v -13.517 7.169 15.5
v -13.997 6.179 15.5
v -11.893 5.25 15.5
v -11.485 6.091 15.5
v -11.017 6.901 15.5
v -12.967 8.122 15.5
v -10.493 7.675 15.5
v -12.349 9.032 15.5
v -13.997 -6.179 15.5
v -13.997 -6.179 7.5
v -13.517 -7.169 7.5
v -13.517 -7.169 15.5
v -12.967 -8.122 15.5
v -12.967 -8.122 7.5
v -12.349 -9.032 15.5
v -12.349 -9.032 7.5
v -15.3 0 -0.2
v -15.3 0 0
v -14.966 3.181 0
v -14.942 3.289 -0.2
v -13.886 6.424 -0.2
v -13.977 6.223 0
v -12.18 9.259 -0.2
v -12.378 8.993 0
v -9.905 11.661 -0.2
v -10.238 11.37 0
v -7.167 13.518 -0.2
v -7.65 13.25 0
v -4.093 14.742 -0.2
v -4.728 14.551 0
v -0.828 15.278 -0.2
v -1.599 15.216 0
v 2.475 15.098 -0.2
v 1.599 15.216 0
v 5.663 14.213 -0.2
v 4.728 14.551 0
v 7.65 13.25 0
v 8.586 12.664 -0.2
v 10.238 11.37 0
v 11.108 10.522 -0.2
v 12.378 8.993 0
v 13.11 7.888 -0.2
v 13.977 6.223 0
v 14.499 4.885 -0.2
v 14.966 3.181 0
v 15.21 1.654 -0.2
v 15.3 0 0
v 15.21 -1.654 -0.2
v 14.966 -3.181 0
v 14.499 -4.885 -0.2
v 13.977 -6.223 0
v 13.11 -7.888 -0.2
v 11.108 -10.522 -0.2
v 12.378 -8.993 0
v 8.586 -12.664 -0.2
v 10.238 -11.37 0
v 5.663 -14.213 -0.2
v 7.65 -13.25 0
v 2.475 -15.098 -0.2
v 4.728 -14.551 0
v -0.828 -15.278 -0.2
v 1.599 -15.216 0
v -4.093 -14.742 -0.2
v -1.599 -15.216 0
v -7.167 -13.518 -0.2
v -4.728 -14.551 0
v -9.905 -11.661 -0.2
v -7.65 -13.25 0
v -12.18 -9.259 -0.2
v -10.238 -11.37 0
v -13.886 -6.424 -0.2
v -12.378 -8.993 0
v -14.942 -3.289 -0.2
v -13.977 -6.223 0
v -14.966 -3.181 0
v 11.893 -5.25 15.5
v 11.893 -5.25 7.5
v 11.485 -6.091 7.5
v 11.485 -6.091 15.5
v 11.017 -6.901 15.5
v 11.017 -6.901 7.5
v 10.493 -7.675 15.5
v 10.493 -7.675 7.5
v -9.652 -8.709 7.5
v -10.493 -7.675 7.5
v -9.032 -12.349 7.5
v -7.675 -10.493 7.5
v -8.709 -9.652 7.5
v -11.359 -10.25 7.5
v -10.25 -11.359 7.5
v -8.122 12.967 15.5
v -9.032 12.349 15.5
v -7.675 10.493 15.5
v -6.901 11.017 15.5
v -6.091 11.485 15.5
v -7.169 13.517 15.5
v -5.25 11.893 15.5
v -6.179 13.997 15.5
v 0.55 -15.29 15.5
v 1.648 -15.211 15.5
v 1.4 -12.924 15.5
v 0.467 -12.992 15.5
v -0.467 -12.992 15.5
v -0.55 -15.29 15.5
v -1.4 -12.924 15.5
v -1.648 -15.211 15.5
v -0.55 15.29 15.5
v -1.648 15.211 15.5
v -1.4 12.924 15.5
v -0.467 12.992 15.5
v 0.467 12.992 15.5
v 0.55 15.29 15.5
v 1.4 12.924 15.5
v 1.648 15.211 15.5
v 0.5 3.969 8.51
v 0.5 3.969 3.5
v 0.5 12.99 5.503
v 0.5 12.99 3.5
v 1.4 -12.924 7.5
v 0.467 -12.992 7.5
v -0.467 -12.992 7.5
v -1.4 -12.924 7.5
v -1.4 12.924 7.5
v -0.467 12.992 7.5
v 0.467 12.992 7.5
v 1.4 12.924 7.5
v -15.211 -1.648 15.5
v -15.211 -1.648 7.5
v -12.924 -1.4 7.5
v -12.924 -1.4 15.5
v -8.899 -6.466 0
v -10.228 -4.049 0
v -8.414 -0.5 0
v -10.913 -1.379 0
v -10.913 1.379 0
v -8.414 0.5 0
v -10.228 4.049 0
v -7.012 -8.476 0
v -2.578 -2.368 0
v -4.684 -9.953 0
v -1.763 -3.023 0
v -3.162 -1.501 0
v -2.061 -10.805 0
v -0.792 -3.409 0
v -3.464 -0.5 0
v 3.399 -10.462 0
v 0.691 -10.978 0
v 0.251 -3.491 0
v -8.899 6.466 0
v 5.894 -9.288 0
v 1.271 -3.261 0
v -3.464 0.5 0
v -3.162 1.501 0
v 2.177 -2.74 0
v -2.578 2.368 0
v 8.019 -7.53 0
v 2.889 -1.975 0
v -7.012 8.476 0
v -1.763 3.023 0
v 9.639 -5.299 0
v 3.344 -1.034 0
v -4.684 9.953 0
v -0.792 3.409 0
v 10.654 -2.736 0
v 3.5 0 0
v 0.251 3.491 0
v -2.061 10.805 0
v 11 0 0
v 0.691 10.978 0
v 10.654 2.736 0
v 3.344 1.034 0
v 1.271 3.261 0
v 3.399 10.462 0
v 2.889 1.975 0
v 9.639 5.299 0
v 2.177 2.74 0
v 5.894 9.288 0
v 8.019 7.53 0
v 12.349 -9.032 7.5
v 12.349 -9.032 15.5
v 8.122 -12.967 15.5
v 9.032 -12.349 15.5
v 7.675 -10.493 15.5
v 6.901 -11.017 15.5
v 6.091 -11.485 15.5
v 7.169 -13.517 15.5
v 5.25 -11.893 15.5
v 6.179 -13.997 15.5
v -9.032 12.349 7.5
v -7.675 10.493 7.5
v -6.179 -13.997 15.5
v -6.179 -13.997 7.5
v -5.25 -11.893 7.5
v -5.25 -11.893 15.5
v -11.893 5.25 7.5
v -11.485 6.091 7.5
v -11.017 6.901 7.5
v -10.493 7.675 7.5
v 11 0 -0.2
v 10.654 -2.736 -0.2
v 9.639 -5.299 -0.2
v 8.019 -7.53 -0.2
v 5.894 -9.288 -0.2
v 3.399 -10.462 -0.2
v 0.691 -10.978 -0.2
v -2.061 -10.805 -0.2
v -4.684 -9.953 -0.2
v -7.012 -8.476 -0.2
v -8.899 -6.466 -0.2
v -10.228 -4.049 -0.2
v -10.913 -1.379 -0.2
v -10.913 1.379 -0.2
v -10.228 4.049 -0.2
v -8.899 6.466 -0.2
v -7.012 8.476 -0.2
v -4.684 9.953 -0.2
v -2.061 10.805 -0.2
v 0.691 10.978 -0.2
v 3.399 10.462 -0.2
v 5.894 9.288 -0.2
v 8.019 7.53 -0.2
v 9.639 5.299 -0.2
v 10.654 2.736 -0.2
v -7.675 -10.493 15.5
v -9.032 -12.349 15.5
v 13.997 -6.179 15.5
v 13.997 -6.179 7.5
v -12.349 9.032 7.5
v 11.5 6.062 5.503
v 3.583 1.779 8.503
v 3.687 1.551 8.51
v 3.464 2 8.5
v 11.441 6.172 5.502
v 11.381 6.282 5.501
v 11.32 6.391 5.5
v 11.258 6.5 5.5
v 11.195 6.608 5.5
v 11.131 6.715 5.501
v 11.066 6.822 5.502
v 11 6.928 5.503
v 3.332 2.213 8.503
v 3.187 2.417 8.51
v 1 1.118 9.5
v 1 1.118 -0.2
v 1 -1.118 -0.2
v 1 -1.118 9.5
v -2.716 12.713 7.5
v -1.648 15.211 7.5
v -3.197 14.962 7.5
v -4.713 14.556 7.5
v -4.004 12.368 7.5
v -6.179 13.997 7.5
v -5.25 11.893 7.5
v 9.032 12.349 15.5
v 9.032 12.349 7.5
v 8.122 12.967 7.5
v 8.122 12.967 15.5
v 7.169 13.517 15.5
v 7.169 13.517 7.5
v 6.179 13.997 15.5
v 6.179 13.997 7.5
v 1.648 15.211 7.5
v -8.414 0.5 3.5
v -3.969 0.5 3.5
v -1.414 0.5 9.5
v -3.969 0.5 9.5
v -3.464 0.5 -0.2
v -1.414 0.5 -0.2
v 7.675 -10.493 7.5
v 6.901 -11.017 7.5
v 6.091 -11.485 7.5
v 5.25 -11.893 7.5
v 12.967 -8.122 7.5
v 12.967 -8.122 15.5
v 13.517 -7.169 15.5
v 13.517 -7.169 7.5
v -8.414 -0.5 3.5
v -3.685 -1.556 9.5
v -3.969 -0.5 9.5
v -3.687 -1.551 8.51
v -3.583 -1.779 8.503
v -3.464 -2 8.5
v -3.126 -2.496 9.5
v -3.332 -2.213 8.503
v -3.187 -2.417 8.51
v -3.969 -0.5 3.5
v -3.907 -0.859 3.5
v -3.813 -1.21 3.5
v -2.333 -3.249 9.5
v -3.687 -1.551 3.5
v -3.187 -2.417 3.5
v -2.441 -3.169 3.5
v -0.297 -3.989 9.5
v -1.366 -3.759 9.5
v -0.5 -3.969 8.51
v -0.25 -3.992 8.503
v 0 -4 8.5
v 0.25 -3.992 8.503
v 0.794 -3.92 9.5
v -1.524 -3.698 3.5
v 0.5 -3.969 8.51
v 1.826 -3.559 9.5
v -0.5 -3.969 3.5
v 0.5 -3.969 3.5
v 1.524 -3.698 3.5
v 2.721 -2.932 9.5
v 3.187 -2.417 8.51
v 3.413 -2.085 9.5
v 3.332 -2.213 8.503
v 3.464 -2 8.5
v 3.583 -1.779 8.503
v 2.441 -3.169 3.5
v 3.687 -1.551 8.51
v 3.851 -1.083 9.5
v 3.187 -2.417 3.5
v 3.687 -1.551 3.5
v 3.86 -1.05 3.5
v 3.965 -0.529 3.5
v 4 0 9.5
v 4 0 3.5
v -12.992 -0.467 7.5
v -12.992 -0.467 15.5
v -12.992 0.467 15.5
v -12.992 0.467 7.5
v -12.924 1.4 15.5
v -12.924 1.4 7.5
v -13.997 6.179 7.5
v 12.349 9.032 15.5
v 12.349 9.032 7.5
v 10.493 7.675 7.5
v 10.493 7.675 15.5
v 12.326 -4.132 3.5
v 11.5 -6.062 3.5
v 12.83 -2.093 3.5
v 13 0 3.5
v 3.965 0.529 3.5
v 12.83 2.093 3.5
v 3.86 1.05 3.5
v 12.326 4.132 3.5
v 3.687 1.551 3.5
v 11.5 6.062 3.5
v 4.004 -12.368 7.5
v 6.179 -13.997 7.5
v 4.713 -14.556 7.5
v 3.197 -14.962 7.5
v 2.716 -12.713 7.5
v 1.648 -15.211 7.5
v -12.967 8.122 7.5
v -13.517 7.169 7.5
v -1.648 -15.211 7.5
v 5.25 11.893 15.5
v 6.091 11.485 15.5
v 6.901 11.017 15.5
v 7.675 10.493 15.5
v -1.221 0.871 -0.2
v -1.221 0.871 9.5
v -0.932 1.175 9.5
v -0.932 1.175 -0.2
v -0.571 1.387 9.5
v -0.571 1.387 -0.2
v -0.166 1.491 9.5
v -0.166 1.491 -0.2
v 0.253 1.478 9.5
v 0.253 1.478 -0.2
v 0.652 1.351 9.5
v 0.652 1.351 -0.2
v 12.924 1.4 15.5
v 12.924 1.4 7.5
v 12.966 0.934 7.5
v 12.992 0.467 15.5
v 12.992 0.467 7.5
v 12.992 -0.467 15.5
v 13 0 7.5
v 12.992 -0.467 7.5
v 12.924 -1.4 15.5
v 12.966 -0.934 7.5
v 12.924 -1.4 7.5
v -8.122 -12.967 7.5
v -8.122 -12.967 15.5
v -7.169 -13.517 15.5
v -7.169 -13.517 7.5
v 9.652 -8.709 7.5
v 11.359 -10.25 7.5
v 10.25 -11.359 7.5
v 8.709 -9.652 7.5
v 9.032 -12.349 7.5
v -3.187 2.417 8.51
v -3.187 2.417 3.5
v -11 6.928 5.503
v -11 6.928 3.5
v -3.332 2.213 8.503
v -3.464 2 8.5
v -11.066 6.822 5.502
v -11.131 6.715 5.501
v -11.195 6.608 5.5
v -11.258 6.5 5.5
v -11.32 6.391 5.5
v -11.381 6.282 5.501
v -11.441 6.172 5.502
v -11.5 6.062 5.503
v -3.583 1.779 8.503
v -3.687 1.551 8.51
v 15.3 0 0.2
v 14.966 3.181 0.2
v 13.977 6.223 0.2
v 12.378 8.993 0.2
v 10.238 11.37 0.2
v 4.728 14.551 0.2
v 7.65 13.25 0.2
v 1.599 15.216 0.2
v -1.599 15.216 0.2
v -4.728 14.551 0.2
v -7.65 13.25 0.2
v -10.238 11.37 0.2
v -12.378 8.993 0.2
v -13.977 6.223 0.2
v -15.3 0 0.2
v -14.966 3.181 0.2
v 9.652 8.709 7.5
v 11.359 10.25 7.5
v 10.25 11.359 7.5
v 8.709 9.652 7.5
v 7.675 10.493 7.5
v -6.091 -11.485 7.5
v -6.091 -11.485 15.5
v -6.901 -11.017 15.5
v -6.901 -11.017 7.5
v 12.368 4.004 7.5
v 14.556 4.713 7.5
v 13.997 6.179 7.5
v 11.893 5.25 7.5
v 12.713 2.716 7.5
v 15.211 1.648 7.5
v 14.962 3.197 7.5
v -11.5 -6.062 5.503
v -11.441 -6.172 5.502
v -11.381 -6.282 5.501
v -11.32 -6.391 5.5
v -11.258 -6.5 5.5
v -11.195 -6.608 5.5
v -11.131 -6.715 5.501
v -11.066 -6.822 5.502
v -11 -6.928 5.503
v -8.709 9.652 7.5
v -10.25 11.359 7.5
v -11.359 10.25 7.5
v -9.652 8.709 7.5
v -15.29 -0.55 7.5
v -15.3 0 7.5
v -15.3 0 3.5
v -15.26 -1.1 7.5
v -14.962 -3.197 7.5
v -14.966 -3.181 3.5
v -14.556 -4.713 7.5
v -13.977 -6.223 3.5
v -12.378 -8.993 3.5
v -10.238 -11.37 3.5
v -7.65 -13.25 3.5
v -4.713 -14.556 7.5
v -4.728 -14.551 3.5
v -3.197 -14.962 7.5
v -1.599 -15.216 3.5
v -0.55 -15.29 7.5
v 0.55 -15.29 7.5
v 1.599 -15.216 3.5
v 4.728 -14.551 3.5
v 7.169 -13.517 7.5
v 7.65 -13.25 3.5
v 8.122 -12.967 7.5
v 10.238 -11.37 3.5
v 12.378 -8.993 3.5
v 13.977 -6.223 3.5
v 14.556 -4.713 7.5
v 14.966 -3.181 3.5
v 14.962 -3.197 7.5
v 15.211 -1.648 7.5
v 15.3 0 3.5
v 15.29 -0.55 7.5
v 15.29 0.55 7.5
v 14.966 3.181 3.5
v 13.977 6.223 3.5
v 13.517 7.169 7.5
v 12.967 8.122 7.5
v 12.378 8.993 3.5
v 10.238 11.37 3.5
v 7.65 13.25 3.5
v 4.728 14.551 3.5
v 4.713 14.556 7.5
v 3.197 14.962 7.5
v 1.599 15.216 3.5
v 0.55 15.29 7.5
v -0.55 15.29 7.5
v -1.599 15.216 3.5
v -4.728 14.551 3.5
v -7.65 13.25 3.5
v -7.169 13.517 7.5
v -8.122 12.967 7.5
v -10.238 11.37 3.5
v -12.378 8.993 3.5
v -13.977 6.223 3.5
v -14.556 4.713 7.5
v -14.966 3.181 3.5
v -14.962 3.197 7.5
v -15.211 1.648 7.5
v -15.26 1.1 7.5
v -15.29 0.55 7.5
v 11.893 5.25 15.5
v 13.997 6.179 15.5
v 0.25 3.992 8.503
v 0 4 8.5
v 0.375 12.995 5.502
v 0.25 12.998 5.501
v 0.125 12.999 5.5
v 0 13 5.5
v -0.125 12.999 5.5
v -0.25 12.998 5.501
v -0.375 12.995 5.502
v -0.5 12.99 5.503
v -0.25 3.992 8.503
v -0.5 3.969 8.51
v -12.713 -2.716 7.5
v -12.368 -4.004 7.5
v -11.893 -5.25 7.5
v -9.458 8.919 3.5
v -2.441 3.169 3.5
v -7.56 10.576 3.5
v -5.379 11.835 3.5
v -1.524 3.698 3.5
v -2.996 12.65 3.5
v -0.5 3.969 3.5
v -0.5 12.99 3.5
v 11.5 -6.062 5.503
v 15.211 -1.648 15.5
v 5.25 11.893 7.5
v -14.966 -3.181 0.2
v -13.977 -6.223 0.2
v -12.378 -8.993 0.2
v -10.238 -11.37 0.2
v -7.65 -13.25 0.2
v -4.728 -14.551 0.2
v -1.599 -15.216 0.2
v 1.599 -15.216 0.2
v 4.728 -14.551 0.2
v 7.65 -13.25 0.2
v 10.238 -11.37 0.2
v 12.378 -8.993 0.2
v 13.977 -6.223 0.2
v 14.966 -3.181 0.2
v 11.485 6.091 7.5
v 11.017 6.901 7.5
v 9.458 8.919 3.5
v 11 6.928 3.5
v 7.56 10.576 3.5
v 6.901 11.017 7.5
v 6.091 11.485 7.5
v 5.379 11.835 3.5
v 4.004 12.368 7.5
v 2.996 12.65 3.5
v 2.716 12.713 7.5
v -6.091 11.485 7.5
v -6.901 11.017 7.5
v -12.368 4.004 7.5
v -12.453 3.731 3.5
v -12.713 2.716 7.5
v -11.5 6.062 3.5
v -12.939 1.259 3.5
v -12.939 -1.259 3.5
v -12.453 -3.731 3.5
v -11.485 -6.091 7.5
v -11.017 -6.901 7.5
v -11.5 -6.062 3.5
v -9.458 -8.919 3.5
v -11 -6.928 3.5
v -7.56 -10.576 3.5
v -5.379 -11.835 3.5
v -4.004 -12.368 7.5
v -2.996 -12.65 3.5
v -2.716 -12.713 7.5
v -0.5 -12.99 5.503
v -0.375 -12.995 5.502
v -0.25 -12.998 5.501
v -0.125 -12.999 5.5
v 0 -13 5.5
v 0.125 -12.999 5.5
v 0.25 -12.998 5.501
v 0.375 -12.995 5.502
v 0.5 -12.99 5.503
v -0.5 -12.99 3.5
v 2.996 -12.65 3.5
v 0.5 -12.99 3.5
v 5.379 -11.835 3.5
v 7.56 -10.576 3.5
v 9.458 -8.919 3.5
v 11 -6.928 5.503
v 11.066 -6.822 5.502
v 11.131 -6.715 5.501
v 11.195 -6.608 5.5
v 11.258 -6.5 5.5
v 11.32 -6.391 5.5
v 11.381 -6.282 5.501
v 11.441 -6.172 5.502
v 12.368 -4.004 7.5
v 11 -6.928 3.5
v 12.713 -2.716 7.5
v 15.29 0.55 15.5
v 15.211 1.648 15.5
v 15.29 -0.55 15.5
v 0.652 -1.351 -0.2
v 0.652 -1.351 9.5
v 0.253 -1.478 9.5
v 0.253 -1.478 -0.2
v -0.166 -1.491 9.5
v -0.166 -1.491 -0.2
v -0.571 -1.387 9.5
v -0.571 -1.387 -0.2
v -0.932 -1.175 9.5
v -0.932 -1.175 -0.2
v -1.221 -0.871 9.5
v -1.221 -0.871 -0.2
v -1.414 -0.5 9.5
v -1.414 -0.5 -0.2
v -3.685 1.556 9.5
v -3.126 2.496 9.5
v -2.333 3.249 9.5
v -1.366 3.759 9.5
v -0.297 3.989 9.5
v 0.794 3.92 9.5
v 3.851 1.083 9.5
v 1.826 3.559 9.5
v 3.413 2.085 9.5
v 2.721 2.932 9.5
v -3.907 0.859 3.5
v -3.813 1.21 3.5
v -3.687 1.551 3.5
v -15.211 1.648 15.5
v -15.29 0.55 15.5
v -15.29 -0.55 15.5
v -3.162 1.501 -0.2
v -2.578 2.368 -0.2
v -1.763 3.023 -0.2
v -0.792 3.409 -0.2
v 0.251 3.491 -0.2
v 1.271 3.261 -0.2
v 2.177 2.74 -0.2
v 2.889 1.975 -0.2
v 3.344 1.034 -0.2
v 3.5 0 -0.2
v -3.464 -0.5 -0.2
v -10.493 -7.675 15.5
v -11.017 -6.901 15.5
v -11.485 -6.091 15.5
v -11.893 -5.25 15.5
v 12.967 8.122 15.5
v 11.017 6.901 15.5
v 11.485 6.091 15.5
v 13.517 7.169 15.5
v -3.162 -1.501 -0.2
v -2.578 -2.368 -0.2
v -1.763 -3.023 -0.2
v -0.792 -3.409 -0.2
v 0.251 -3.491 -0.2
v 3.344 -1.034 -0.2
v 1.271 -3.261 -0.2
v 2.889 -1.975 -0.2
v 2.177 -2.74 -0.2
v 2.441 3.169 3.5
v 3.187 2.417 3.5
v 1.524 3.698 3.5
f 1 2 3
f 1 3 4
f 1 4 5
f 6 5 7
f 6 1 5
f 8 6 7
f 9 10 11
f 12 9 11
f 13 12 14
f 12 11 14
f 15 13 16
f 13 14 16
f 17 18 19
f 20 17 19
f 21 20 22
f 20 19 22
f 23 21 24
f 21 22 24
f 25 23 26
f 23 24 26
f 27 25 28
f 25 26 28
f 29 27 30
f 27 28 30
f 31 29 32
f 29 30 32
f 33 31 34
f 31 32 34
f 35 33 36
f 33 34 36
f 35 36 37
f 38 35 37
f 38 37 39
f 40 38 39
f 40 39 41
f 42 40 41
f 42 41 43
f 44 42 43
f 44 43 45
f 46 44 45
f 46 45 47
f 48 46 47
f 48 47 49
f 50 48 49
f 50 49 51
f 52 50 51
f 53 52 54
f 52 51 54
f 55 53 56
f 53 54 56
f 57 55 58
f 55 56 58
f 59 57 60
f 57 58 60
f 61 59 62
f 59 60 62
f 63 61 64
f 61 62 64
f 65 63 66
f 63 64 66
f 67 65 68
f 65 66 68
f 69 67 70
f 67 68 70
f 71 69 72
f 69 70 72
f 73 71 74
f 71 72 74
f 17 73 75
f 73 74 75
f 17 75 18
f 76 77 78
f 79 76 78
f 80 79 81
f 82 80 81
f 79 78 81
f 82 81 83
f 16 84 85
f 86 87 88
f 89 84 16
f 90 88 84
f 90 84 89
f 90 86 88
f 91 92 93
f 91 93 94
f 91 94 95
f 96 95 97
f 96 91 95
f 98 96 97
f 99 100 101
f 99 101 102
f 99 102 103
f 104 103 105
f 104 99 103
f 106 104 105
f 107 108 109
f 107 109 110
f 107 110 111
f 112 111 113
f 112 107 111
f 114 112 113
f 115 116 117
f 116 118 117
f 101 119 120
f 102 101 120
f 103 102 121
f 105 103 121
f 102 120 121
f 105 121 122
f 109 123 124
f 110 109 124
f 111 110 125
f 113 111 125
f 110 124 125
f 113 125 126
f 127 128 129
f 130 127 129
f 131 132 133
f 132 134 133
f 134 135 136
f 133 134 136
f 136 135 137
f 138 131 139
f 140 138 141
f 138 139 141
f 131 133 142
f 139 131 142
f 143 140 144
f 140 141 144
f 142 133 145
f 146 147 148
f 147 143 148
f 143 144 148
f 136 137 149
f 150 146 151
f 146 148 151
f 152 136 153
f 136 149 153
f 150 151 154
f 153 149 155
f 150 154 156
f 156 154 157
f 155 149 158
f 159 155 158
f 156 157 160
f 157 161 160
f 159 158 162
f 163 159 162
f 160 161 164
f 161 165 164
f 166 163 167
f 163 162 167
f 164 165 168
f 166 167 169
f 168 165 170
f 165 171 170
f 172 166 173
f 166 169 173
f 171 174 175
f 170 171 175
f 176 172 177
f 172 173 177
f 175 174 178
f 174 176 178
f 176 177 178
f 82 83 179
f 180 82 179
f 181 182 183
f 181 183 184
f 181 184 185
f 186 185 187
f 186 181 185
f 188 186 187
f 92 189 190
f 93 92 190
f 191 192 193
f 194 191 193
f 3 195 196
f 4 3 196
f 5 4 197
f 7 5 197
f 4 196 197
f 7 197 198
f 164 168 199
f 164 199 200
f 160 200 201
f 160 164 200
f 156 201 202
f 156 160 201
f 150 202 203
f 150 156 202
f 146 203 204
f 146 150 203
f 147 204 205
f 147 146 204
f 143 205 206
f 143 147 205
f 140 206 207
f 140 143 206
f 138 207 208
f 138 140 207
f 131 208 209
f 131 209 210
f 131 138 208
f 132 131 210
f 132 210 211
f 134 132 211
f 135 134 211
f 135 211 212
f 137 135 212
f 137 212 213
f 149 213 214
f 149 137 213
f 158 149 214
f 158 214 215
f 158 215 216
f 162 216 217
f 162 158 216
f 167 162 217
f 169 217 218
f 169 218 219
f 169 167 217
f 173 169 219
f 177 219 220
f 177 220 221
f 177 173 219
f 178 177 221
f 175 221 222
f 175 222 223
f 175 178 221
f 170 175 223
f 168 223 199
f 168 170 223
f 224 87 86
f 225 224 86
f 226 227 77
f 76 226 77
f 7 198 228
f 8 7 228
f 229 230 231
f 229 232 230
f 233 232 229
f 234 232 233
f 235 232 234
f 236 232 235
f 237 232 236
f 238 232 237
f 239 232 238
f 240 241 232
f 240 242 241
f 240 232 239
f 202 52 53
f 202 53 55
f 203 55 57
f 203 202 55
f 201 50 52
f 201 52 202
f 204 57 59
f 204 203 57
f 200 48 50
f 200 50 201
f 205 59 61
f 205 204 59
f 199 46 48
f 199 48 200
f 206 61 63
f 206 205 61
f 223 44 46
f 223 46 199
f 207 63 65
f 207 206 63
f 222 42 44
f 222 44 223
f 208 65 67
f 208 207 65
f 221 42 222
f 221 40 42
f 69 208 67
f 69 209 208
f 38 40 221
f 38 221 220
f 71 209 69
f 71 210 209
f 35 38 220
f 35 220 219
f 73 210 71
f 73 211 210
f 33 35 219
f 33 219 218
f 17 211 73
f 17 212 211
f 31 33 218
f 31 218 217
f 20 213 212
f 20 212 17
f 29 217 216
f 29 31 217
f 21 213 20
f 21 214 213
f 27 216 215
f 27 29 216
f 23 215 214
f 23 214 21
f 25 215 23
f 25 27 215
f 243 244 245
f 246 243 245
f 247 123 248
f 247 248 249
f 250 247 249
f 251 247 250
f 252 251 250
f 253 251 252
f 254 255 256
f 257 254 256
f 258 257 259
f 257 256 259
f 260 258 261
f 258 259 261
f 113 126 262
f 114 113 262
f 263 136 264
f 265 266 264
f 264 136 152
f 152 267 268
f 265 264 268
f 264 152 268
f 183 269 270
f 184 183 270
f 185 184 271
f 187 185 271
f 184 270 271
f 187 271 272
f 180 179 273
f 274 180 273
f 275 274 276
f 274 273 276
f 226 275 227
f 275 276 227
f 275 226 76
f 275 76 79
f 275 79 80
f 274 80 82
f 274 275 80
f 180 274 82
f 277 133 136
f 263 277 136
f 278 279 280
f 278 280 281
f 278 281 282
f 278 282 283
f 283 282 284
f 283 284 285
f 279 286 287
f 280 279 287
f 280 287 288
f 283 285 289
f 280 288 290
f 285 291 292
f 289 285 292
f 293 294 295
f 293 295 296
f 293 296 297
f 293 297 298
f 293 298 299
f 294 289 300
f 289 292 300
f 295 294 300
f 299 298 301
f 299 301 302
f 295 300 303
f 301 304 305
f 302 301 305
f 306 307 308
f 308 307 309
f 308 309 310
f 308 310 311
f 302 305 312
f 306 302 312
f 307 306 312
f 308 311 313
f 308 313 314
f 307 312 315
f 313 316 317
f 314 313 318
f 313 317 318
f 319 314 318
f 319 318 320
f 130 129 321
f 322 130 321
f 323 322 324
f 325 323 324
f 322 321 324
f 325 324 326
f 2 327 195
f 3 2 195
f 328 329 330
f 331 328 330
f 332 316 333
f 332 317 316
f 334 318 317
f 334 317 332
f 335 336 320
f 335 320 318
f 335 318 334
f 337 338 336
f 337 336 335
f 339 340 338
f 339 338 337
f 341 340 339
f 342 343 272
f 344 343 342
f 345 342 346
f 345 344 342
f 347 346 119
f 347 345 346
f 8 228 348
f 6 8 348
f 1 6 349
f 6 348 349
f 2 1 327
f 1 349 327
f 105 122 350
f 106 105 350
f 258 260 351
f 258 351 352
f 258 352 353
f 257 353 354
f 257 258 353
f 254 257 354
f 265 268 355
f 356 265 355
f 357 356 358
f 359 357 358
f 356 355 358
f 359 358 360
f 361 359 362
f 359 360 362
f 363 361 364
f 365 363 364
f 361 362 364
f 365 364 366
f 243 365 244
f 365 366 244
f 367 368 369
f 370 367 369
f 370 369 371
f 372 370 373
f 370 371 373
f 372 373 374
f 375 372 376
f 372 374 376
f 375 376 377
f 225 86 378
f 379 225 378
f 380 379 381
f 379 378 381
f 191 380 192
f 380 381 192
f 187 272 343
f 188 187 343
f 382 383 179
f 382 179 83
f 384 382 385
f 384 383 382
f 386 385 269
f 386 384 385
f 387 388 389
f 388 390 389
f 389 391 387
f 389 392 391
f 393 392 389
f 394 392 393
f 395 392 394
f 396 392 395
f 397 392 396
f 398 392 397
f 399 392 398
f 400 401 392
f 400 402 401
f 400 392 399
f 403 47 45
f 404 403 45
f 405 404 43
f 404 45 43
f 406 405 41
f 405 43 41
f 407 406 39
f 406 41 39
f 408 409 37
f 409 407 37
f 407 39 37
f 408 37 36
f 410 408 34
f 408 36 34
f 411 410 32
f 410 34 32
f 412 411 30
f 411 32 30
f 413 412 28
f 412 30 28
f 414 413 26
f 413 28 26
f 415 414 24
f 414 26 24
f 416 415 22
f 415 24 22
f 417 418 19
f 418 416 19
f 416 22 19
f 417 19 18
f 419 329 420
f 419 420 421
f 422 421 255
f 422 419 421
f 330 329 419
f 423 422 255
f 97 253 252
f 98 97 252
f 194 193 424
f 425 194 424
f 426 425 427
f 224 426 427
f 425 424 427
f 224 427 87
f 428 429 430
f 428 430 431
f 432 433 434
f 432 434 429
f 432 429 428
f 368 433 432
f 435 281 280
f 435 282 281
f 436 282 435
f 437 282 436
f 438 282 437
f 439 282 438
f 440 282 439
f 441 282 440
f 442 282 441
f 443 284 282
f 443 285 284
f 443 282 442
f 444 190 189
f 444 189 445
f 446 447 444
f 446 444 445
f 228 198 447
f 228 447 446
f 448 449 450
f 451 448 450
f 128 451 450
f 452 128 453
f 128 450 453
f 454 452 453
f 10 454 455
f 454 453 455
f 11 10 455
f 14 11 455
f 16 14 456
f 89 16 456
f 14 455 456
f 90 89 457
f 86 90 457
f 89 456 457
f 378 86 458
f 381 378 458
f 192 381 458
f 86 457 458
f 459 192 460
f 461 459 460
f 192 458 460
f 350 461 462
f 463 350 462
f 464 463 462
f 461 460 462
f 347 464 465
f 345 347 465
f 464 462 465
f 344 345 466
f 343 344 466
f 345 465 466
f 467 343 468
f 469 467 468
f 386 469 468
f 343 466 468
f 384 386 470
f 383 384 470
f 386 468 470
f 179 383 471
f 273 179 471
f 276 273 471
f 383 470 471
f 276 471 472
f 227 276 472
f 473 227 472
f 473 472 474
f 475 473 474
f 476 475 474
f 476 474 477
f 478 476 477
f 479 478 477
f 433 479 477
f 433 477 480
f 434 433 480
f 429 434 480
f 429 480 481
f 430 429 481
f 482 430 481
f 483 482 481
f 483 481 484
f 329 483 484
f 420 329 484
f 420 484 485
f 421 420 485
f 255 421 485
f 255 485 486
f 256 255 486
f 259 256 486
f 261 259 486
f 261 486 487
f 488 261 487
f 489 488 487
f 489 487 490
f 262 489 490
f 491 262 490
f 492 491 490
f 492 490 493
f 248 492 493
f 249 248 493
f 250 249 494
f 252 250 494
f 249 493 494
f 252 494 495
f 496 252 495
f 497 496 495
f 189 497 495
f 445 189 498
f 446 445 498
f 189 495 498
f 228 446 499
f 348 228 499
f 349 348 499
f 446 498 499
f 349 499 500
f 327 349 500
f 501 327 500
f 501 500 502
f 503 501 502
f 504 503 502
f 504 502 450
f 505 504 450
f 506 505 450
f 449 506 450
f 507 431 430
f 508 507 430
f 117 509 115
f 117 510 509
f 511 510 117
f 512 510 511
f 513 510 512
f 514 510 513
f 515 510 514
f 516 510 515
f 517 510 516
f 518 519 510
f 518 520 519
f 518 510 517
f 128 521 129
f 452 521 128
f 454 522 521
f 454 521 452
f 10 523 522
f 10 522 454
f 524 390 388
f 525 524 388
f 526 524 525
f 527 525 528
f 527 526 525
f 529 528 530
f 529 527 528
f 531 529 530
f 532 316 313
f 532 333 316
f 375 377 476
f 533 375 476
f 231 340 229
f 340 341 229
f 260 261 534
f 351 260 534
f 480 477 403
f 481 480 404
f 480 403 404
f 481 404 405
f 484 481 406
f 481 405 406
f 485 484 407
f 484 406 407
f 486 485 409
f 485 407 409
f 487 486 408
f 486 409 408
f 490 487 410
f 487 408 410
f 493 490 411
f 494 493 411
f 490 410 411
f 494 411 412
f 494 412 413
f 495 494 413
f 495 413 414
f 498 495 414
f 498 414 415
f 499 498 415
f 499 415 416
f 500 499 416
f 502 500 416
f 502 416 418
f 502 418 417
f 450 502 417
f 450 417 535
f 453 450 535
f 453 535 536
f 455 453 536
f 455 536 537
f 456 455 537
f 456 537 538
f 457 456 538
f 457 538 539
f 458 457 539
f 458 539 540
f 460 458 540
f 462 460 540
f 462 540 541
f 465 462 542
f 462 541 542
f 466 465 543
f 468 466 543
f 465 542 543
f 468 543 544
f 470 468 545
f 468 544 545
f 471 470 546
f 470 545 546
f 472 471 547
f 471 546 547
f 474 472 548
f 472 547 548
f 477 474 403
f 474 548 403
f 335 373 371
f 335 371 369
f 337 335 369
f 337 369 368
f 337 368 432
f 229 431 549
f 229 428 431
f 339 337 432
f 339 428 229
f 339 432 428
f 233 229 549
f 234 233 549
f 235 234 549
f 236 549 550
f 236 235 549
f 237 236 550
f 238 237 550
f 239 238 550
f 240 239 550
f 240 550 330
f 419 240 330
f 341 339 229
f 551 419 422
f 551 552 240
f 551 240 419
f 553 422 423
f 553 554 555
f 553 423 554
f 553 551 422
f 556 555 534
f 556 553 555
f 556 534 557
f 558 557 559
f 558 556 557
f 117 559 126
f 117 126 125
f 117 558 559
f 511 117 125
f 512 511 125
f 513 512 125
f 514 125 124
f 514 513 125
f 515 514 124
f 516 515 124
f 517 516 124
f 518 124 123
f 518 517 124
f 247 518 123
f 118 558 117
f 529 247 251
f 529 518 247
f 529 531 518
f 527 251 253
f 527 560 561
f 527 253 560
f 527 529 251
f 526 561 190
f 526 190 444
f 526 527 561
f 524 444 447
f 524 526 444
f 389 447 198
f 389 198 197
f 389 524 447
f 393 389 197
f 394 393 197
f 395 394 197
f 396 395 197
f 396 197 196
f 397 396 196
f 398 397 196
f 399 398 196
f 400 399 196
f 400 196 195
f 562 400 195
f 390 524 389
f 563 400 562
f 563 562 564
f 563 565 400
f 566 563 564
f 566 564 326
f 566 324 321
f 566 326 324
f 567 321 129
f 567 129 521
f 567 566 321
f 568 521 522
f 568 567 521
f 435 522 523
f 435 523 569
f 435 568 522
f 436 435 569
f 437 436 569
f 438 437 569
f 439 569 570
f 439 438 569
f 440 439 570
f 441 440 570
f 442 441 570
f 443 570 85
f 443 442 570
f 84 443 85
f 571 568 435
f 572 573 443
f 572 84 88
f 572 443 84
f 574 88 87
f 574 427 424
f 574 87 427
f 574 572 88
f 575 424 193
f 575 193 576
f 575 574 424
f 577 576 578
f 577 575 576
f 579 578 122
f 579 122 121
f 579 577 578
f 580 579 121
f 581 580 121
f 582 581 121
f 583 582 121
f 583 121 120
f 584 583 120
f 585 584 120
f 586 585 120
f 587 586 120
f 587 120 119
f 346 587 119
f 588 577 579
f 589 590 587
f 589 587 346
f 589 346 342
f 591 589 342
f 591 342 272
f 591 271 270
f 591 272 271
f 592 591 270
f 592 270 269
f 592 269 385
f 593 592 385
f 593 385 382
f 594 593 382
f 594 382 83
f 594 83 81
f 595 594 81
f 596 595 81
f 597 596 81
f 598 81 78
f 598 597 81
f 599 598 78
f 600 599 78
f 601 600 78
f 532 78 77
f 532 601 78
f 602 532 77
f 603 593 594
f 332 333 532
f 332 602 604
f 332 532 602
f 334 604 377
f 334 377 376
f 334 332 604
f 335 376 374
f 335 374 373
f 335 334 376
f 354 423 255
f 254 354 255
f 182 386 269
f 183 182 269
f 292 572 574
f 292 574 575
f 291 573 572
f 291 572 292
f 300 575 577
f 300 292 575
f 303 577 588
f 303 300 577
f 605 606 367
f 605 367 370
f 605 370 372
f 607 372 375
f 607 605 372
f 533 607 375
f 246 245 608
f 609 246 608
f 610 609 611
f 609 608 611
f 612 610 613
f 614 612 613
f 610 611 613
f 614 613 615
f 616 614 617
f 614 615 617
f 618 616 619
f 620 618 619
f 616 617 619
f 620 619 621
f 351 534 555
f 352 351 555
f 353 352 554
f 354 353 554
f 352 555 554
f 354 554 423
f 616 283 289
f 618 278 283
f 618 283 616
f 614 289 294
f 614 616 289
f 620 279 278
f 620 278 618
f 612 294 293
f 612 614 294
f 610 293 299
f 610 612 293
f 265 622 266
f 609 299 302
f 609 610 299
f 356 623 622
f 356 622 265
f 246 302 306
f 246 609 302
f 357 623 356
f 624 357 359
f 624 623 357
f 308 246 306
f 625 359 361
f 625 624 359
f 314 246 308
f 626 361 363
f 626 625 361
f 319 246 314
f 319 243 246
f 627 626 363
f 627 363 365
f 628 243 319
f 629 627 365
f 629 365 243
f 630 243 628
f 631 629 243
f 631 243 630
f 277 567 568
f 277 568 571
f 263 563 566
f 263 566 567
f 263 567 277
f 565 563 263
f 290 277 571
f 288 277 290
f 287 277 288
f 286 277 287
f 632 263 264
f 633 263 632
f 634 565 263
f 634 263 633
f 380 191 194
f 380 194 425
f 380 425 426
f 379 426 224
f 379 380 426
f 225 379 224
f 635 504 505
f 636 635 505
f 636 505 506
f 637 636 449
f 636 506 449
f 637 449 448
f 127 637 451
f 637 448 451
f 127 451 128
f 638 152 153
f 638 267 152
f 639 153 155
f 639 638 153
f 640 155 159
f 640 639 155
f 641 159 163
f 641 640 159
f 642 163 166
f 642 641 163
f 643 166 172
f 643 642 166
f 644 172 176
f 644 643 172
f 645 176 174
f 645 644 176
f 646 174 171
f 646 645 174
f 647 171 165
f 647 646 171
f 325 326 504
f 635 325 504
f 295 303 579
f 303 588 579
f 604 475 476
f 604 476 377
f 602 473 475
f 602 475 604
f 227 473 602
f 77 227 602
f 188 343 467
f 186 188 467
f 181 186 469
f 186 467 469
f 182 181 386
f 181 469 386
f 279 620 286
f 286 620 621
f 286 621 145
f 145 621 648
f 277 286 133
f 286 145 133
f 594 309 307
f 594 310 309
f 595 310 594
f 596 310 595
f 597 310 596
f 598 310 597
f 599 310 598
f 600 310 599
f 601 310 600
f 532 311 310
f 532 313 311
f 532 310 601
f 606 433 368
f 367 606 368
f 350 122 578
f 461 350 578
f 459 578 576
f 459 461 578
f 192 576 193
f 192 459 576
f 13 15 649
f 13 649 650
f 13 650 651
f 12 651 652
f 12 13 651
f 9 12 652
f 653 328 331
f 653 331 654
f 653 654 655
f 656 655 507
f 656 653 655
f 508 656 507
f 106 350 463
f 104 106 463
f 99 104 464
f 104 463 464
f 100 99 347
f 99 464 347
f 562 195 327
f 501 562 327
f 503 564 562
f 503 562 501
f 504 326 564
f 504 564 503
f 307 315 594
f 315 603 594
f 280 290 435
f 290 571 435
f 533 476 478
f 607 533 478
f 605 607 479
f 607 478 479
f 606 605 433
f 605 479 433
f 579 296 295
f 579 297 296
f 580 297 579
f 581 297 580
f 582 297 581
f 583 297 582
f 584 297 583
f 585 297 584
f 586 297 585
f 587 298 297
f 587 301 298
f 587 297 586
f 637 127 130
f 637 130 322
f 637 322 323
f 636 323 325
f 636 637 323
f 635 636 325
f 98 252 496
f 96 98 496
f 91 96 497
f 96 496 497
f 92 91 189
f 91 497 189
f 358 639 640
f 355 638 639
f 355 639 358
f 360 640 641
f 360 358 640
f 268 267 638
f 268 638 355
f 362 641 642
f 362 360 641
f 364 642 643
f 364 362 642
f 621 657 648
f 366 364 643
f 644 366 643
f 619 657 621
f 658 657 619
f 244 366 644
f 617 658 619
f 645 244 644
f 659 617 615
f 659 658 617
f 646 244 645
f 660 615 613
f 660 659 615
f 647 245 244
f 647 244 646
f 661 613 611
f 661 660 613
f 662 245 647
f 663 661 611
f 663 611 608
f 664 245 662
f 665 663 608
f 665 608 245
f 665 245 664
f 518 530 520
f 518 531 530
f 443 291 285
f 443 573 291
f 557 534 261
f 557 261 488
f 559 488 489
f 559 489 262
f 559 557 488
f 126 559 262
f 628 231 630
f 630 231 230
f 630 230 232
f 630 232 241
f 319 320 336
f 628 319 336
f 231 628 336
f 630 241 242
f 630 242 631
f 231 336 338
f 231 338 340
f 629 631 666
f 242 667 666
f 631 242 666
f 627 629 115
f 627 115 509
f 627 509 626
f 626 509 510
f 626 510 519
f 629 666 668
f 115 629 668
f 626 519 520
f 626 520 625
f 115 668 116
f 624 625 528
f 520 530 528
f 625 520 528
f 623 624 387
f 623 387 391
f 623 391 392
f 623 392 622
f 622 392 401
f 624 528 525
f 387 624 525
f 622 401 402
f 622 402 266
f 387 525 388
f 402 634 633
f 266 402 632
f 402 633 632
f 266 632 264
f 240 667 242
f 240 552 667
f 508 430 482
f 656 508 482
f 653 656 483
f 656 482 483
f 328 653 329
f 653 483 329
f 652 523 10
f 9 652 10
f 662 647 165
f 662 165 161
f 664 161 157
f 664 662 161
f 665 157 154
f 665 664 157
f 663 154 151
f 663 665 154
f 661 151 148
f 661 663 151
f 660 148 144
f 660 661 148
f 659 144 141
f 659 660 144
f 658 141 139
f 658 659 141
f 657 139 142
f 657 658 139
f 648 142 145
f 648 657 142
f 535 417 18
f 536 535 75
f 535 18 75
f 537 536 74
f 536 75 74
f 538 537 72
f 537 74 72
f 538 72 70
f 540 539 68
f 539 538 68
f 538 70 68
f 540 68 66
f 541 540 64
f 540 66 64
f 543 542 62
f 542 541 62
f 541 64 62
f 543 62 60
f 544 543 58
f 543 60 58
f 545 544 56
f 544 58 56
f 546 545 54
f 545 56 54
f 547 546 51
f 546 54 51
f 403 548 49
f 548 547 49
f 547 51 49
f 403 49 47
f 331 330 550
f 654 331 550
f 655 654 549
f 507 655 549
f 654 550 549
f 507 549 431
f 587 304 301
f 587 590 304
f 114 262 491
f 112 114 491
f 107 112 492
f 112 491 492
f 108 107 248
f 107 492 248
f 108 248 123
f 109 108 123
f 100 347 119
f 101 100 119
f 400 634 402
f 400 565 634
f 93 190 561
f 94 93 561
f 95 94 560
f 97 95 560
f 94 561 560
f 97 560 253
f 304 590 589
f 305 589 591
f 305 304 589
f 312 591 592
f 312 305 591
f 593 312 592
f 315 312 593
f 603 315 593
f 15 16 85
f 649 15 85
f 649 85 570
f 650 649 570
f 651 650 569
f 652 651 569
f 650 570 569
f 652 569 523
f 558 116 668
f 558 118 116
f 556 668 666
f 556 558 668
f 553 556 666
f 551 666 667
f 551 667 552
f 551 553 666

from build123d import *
from build123d.topology import SkipClean

# Parameters (mm, degrees)
ESQUISSE1_R                  = 15.3
BOSS_EXTRU_1_DEPTH           = 3.5
ESQUISSE7_R                  = 15.3
ESQUISSE7_R_2                = 11
ESQUISSE7_R_3                = 3.5
BOSS_EXTRU_10_DEPTH          = 0.2
ESQUISSE2_R                  = 4
BOSS_EXTRU_2_DEPTH           = 6
ENL_V_MAT_EXTRU_2_DEPTH      = 24.631123545
ENL_V_MAT_EXTRU_2_DEPTH_BACK = 24.631123545
ESQUISSE4_R                  = 15.3
ESQUISSE4_R_2                = 13
BOSS_EXTRU_3_DEPTH           = 4
BOSS_EXTRU_4_DEPTH           = 8
R_P_TITION_CIRCULAIRE1_COUNT = 12
BOSS_EXTRU_9_DEPTH           = 0.5
R_P_TITION_CIRCULAIRE4_COUNT = 6


with BuildPart() as part:
    # Esquisse1 → Boss.-Extru.1 (new body)
    with BuildSketch(Plane.XY):
        Circle(ESQUISSE1_R)
    extrude(amount=BOSS_EXTRU_1_DEPTH)

    # Esquisse7 → Boss.-Extru.10 (add, symmetric)
    # profile 1 of 2: a face of its own
    with SkipClean():  # the faces are left unmerged after this step: merging them gives an invalid solid
        with BuildSketch(Plane(origin=(0, 0, 0), x_dir=(-1, 0, 0), z_dir=(0, 0, -1))):
            Circle(ESQUISSE7_R)
            Circle(ESQUISSE7_R_2, mode=Mode.SUBTRACT)
        # profile 2 of 2: a face of its own
        with BuildSketch(Plane(origin=(0, 0, 0), x_dir=(-1, 0, 0), z_dir=(0, 0, -1))):
            Circle(ESQUISSE7_R_3)
        extrude(amount=BOSS_EXTRU_10_DEPTH, both=True)

    # Esquisse2 → Boss.-Extru.2 (add)
    with SkipClean():  # the faces are left unmerged after this step: merging them gives an invalid solid
        with BuildSketch(Plane.XY.offset(3.5)):
            Circle(ESQUISSE2_R)
        extrude(amount=BOSS_EXTRU_2_DEPTH)

    # Esquisse3 → Enlèv. mat.-Extru.2 (cut, two sides: drawn at the far end of the back side and taken through both)
    with SkipClean():  # the faces are left unmerged after this step: merging them gives an invalid solid
        with BuildSketch(Plane.XY.offset(-ENL_V_MAT_EXTRU_2_DEPTH_BACK)):
            with BuildLine():
                Line((1, 1.118033989), (1, -1.118033989))
                ThreePointArc((1, -1.118033989), (-0.37200097, -1.4531398), (-1.414213562, -0.5))
                Line((-1.414213562, -0.5), (-8.414213562, -0.5))
                Line((-8.414213562, -0.5), (-8.414213562, 0.5))
                Line((-8.414213562, 0.5), (-1.414213562, 0.5))
                ThreePointArc((-1.414213562, 0.5), (-0.37200097, 1.4531398), (1, 1.118033989))
            make_face()
        extrude(amount=ENL_V_MAT_EXTRU_2_DEPTH + ENL_V_MAT_EXTRU_2_DEPTH_BACK, mode=Mode.SUBTRACT)

    # Esquisse4 → Boss.-Extru.3 (add)
    with SkipClean():  # the faces are left unmerged after this step: merging them gives an invalid solid
        with BuildSketch(Plane.XY.offset(3.5)):
            Circle(ESQUISSE4_R)
            Circle(ESQUISSE4_R_2, mode=Mode.SUBTRACT)
        extrude(amount=BOSS_EXTRU_3_DEPTH)

    # Esquisse5 → Boss.-Extru.4 (add)
    with SkipClean():  # the faces are left unmerged after this step: merging them gives an invalid solid
        with BuildSketch(Plane.XY.offset(7.5)):
            with BuildLine():
                Line((-1.647692308, 15.211019363), (-1.4, 12.924395537))
                ThreePointArc((-1.4, 12.924395537), (0, 13), (1.4, 12.924395537))
                Line((1.4, 12.924395537), (1.647692308, 15.211019363))
                ThreePointArc((1.647692308, 15.211019363), (0, 15.3), (-1.647692308, 15.211019363))
            make_face()
        boss_extru_4 = extrude(amount=BOSS_EXTRU_4_DEPTH)

    # Répétition circulaire1: Boss.-Extru.4 ×12 about axis
    with SkipClean():  # the faces are left unmerged after this step: merging them gives an invalid solid
        r_p_tition_circulaire1_axis = Axis((0, 0, -0.775), (0, 0, 1))
        for i in range(1, R_P_TITION_CIRCULAIRE1_COUNT):
            add(boss_extru_4.rotate(r_p_tition_circulaire1_axis, i * 360 / R_P_TITION_CIRCULAIRE1_COUNT))

    # Esquisse6 → Boss.-Extru.9 (add, symmetric)
    with SkipClean():  # the faces are left unmerged after this step: merging them gives an invalid solid
        with BuildSketch(Plane(origin=(0, 0, 0), x_dir=(0, 0, 1), z_dir=(1, 0, 0))):
            Polygon((8.833333333, 3), (5.5, 13), (3.5, 13), (3.5, 3), align=None)
        boss_extru_9 = extrude(amount=BOSS_EXTRU_9_DEPTH, both=True)

    # Répétition circulaire4: Boss.-Extru.9 ×6 about axis
    with SkipClean():  # the faces are left unmerged after this step: merging them gives an invalid solid
        r_p_tition_circulaire4_axis = Axis((0, 0, -0.775), (0, 0, 1))
        for i in range(1, R_P_TITION_CIRCULAIRE4_COUNT):
            add(boss_extru_9.rotate(r_p_tition_circulaire4_axis, i * 360 / R_P_TITION_CIRCULAIRE4_COUNT))


solid = part.part
